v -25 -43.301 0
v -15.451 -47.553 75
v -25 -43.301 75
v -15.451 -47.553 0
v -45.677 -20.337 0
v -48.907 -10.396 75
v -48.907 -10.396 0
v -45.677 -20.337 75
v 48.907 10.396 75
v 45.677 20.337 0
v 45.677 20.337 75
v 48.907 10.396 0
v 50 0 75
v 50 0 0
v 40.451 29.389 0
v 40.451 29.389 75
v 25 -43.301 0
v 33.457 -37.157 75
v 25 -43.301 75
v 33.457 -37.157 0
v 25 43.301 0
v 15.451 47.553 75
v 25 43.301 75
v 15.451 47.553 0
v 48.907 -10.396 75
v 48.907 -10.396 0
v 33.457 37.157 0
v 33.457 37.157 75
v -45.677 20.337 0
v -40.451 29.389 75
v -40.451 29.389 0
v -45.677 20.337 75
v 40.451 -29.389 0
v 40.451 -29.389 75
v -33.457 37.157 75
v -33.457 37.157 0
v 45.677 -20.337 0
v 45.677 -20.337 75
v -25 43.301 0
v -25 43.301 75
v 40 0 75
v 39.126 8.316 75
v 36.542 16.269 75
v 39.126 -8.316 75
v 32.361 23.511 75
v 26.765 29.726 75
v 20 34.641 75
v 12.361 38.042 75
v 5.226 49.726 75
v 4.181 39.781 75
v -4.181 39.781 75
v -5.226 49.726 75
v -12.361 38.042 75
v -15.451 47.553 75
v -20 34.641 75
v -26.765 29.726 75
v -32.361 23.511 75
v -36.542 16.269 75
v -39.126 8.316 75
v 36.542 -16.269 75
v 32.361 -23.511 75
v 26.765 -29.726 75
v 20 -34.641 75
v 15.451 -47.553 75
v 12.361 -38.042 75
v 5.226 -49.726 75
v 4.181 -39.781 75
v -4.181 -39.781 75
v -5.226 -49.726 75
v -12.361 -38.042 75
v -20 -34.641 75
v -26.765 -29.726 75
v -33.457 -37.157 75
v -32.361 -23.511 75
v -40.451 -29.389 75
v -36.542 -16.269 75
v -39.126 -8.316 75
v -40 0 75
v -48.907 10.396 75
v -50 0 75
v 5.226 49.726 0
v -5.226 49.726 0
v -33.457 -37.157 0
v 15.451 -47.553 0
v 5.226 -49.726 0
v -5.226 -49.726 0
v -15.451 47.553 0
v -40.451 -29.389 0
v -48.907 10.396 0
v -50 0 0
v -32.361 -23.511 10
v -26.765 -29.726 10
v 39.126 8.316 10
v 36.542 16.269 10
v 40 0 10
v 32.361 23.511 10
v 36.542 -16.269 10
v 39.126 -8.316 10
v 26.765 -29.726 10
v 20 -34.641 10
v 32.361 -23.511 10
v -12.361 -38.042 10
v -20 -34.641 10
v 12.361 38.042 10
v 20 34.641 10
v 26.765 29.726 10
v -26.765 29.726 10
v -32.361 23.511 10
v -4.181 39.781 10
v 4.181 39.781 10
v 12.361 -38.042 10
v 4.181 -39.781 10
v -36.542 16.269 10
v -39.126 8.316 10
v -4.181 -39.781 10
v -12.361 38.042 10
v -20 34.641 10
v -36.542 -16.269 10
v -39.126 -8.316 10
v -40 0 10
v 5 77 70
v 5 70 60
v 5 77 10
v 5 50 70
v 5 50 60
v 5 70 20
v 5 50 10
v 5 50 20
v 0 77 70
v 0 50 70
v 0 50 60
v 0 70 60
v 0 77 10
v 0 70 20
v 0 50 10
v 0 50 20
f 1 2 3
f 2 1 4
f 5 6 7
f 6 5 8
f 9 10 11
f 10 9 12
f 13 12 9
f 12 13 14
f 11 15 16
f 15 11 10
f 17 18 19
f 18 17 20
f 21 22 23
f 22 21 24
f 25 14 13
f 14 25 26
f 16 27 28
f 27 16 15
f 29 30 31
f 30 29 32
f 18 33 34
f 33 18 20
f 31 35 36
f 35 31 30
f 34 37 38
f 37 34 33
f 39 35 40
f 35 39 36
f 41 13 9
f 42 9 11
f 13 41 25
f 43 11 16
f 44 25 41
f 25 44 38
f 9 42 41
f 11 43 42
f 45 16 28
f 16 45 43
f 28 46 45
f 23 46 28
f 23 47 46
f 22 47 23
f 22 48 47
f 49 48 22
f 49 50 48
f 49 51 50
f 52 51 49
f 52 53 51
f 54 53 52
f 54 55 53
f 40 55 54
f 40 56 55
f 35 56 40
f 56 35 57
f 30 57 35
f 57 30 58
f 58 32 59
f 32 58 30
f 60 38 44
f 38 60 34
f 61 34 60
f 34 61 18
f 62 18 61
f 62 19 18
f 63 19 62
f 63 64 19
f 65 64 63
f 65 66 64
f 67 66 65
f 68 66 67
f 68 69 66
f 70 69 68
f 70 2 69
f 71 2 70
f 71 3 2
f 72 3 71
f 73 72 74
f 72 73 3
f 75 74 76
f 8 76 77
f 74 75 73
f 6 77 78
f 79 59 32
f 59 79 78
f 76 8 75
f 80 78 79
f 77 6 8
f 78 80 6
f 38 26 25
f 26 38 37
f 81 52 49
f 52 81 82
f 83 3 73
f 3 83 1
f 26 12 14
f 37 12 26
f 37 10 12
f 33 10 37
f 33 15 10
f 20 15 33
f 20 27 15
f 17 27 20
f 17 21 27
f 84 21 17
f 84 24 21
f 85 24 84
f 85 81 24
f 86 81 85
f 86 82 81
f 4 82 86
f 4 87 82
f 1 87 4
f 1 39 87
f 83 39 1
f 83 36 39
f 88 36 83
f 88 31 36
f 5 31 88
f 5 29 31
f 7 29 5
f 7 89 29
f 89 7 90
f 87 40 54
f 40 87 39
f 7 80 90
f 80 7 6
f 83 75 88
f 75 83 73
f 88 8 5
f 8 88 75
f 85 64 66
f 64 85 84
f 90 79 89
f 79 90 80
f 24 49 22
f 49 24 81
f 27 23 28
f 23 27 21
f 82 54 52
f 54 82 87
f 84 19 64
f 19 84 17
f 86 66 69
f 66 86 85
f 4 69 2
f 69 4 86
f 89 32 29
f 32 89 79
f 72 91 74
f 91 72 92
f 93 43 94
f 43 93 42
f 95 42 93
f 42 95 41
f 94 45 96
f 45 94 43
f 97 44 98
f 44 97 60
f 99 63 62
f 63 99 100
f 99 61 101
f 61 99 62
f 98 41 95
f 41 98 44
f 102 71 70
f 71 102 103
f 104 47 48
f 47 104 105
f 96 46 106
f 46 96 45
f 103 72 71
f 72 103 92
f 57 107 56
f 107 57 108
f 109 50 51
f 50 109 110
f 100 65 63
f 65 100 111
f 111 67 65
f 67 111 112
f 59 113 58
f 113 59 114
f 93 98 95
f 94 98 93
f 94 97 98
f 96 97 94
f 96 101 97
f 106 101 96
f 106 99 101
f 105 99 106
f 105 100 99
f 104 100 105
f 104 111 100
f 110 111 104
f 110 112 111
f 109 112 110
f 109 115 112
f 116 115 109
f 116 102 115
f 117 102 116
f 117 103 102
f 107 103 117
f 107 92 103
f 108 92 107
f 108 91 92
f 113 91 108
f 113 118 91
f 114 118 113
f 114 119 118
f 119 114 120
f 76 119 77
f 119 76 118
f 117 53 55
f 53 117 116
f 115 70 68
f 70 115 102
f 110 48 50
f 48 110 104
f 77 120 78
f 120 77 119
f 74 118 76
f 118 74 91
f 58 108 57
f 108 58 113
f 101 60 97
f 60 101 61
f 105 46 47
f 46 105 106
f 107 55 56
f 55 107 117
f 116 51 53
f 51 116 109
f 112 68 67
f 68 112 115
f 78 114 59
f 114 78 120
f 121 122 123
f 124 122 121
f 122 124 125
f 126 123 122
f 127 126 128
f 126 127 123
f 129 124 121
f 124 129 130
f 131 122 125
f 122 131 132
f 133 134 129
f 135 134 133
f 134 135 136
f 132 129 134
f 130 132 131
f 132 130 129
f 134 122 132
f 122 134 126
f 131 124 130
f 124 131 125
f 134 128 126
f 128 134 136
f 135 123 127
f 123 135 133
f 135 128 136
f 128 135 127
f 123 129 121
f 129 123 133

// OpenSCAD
difference(){

cylinder(h=75,r=50);

translate([0,0,10])

cylinder(h=75,r=40);

}

translate([0,50,60])

cube([5,20,10]);

translate([0,50,10])

cube([5,20,10]);

translate([0,70,10])

cube([5,7,60]);

 
